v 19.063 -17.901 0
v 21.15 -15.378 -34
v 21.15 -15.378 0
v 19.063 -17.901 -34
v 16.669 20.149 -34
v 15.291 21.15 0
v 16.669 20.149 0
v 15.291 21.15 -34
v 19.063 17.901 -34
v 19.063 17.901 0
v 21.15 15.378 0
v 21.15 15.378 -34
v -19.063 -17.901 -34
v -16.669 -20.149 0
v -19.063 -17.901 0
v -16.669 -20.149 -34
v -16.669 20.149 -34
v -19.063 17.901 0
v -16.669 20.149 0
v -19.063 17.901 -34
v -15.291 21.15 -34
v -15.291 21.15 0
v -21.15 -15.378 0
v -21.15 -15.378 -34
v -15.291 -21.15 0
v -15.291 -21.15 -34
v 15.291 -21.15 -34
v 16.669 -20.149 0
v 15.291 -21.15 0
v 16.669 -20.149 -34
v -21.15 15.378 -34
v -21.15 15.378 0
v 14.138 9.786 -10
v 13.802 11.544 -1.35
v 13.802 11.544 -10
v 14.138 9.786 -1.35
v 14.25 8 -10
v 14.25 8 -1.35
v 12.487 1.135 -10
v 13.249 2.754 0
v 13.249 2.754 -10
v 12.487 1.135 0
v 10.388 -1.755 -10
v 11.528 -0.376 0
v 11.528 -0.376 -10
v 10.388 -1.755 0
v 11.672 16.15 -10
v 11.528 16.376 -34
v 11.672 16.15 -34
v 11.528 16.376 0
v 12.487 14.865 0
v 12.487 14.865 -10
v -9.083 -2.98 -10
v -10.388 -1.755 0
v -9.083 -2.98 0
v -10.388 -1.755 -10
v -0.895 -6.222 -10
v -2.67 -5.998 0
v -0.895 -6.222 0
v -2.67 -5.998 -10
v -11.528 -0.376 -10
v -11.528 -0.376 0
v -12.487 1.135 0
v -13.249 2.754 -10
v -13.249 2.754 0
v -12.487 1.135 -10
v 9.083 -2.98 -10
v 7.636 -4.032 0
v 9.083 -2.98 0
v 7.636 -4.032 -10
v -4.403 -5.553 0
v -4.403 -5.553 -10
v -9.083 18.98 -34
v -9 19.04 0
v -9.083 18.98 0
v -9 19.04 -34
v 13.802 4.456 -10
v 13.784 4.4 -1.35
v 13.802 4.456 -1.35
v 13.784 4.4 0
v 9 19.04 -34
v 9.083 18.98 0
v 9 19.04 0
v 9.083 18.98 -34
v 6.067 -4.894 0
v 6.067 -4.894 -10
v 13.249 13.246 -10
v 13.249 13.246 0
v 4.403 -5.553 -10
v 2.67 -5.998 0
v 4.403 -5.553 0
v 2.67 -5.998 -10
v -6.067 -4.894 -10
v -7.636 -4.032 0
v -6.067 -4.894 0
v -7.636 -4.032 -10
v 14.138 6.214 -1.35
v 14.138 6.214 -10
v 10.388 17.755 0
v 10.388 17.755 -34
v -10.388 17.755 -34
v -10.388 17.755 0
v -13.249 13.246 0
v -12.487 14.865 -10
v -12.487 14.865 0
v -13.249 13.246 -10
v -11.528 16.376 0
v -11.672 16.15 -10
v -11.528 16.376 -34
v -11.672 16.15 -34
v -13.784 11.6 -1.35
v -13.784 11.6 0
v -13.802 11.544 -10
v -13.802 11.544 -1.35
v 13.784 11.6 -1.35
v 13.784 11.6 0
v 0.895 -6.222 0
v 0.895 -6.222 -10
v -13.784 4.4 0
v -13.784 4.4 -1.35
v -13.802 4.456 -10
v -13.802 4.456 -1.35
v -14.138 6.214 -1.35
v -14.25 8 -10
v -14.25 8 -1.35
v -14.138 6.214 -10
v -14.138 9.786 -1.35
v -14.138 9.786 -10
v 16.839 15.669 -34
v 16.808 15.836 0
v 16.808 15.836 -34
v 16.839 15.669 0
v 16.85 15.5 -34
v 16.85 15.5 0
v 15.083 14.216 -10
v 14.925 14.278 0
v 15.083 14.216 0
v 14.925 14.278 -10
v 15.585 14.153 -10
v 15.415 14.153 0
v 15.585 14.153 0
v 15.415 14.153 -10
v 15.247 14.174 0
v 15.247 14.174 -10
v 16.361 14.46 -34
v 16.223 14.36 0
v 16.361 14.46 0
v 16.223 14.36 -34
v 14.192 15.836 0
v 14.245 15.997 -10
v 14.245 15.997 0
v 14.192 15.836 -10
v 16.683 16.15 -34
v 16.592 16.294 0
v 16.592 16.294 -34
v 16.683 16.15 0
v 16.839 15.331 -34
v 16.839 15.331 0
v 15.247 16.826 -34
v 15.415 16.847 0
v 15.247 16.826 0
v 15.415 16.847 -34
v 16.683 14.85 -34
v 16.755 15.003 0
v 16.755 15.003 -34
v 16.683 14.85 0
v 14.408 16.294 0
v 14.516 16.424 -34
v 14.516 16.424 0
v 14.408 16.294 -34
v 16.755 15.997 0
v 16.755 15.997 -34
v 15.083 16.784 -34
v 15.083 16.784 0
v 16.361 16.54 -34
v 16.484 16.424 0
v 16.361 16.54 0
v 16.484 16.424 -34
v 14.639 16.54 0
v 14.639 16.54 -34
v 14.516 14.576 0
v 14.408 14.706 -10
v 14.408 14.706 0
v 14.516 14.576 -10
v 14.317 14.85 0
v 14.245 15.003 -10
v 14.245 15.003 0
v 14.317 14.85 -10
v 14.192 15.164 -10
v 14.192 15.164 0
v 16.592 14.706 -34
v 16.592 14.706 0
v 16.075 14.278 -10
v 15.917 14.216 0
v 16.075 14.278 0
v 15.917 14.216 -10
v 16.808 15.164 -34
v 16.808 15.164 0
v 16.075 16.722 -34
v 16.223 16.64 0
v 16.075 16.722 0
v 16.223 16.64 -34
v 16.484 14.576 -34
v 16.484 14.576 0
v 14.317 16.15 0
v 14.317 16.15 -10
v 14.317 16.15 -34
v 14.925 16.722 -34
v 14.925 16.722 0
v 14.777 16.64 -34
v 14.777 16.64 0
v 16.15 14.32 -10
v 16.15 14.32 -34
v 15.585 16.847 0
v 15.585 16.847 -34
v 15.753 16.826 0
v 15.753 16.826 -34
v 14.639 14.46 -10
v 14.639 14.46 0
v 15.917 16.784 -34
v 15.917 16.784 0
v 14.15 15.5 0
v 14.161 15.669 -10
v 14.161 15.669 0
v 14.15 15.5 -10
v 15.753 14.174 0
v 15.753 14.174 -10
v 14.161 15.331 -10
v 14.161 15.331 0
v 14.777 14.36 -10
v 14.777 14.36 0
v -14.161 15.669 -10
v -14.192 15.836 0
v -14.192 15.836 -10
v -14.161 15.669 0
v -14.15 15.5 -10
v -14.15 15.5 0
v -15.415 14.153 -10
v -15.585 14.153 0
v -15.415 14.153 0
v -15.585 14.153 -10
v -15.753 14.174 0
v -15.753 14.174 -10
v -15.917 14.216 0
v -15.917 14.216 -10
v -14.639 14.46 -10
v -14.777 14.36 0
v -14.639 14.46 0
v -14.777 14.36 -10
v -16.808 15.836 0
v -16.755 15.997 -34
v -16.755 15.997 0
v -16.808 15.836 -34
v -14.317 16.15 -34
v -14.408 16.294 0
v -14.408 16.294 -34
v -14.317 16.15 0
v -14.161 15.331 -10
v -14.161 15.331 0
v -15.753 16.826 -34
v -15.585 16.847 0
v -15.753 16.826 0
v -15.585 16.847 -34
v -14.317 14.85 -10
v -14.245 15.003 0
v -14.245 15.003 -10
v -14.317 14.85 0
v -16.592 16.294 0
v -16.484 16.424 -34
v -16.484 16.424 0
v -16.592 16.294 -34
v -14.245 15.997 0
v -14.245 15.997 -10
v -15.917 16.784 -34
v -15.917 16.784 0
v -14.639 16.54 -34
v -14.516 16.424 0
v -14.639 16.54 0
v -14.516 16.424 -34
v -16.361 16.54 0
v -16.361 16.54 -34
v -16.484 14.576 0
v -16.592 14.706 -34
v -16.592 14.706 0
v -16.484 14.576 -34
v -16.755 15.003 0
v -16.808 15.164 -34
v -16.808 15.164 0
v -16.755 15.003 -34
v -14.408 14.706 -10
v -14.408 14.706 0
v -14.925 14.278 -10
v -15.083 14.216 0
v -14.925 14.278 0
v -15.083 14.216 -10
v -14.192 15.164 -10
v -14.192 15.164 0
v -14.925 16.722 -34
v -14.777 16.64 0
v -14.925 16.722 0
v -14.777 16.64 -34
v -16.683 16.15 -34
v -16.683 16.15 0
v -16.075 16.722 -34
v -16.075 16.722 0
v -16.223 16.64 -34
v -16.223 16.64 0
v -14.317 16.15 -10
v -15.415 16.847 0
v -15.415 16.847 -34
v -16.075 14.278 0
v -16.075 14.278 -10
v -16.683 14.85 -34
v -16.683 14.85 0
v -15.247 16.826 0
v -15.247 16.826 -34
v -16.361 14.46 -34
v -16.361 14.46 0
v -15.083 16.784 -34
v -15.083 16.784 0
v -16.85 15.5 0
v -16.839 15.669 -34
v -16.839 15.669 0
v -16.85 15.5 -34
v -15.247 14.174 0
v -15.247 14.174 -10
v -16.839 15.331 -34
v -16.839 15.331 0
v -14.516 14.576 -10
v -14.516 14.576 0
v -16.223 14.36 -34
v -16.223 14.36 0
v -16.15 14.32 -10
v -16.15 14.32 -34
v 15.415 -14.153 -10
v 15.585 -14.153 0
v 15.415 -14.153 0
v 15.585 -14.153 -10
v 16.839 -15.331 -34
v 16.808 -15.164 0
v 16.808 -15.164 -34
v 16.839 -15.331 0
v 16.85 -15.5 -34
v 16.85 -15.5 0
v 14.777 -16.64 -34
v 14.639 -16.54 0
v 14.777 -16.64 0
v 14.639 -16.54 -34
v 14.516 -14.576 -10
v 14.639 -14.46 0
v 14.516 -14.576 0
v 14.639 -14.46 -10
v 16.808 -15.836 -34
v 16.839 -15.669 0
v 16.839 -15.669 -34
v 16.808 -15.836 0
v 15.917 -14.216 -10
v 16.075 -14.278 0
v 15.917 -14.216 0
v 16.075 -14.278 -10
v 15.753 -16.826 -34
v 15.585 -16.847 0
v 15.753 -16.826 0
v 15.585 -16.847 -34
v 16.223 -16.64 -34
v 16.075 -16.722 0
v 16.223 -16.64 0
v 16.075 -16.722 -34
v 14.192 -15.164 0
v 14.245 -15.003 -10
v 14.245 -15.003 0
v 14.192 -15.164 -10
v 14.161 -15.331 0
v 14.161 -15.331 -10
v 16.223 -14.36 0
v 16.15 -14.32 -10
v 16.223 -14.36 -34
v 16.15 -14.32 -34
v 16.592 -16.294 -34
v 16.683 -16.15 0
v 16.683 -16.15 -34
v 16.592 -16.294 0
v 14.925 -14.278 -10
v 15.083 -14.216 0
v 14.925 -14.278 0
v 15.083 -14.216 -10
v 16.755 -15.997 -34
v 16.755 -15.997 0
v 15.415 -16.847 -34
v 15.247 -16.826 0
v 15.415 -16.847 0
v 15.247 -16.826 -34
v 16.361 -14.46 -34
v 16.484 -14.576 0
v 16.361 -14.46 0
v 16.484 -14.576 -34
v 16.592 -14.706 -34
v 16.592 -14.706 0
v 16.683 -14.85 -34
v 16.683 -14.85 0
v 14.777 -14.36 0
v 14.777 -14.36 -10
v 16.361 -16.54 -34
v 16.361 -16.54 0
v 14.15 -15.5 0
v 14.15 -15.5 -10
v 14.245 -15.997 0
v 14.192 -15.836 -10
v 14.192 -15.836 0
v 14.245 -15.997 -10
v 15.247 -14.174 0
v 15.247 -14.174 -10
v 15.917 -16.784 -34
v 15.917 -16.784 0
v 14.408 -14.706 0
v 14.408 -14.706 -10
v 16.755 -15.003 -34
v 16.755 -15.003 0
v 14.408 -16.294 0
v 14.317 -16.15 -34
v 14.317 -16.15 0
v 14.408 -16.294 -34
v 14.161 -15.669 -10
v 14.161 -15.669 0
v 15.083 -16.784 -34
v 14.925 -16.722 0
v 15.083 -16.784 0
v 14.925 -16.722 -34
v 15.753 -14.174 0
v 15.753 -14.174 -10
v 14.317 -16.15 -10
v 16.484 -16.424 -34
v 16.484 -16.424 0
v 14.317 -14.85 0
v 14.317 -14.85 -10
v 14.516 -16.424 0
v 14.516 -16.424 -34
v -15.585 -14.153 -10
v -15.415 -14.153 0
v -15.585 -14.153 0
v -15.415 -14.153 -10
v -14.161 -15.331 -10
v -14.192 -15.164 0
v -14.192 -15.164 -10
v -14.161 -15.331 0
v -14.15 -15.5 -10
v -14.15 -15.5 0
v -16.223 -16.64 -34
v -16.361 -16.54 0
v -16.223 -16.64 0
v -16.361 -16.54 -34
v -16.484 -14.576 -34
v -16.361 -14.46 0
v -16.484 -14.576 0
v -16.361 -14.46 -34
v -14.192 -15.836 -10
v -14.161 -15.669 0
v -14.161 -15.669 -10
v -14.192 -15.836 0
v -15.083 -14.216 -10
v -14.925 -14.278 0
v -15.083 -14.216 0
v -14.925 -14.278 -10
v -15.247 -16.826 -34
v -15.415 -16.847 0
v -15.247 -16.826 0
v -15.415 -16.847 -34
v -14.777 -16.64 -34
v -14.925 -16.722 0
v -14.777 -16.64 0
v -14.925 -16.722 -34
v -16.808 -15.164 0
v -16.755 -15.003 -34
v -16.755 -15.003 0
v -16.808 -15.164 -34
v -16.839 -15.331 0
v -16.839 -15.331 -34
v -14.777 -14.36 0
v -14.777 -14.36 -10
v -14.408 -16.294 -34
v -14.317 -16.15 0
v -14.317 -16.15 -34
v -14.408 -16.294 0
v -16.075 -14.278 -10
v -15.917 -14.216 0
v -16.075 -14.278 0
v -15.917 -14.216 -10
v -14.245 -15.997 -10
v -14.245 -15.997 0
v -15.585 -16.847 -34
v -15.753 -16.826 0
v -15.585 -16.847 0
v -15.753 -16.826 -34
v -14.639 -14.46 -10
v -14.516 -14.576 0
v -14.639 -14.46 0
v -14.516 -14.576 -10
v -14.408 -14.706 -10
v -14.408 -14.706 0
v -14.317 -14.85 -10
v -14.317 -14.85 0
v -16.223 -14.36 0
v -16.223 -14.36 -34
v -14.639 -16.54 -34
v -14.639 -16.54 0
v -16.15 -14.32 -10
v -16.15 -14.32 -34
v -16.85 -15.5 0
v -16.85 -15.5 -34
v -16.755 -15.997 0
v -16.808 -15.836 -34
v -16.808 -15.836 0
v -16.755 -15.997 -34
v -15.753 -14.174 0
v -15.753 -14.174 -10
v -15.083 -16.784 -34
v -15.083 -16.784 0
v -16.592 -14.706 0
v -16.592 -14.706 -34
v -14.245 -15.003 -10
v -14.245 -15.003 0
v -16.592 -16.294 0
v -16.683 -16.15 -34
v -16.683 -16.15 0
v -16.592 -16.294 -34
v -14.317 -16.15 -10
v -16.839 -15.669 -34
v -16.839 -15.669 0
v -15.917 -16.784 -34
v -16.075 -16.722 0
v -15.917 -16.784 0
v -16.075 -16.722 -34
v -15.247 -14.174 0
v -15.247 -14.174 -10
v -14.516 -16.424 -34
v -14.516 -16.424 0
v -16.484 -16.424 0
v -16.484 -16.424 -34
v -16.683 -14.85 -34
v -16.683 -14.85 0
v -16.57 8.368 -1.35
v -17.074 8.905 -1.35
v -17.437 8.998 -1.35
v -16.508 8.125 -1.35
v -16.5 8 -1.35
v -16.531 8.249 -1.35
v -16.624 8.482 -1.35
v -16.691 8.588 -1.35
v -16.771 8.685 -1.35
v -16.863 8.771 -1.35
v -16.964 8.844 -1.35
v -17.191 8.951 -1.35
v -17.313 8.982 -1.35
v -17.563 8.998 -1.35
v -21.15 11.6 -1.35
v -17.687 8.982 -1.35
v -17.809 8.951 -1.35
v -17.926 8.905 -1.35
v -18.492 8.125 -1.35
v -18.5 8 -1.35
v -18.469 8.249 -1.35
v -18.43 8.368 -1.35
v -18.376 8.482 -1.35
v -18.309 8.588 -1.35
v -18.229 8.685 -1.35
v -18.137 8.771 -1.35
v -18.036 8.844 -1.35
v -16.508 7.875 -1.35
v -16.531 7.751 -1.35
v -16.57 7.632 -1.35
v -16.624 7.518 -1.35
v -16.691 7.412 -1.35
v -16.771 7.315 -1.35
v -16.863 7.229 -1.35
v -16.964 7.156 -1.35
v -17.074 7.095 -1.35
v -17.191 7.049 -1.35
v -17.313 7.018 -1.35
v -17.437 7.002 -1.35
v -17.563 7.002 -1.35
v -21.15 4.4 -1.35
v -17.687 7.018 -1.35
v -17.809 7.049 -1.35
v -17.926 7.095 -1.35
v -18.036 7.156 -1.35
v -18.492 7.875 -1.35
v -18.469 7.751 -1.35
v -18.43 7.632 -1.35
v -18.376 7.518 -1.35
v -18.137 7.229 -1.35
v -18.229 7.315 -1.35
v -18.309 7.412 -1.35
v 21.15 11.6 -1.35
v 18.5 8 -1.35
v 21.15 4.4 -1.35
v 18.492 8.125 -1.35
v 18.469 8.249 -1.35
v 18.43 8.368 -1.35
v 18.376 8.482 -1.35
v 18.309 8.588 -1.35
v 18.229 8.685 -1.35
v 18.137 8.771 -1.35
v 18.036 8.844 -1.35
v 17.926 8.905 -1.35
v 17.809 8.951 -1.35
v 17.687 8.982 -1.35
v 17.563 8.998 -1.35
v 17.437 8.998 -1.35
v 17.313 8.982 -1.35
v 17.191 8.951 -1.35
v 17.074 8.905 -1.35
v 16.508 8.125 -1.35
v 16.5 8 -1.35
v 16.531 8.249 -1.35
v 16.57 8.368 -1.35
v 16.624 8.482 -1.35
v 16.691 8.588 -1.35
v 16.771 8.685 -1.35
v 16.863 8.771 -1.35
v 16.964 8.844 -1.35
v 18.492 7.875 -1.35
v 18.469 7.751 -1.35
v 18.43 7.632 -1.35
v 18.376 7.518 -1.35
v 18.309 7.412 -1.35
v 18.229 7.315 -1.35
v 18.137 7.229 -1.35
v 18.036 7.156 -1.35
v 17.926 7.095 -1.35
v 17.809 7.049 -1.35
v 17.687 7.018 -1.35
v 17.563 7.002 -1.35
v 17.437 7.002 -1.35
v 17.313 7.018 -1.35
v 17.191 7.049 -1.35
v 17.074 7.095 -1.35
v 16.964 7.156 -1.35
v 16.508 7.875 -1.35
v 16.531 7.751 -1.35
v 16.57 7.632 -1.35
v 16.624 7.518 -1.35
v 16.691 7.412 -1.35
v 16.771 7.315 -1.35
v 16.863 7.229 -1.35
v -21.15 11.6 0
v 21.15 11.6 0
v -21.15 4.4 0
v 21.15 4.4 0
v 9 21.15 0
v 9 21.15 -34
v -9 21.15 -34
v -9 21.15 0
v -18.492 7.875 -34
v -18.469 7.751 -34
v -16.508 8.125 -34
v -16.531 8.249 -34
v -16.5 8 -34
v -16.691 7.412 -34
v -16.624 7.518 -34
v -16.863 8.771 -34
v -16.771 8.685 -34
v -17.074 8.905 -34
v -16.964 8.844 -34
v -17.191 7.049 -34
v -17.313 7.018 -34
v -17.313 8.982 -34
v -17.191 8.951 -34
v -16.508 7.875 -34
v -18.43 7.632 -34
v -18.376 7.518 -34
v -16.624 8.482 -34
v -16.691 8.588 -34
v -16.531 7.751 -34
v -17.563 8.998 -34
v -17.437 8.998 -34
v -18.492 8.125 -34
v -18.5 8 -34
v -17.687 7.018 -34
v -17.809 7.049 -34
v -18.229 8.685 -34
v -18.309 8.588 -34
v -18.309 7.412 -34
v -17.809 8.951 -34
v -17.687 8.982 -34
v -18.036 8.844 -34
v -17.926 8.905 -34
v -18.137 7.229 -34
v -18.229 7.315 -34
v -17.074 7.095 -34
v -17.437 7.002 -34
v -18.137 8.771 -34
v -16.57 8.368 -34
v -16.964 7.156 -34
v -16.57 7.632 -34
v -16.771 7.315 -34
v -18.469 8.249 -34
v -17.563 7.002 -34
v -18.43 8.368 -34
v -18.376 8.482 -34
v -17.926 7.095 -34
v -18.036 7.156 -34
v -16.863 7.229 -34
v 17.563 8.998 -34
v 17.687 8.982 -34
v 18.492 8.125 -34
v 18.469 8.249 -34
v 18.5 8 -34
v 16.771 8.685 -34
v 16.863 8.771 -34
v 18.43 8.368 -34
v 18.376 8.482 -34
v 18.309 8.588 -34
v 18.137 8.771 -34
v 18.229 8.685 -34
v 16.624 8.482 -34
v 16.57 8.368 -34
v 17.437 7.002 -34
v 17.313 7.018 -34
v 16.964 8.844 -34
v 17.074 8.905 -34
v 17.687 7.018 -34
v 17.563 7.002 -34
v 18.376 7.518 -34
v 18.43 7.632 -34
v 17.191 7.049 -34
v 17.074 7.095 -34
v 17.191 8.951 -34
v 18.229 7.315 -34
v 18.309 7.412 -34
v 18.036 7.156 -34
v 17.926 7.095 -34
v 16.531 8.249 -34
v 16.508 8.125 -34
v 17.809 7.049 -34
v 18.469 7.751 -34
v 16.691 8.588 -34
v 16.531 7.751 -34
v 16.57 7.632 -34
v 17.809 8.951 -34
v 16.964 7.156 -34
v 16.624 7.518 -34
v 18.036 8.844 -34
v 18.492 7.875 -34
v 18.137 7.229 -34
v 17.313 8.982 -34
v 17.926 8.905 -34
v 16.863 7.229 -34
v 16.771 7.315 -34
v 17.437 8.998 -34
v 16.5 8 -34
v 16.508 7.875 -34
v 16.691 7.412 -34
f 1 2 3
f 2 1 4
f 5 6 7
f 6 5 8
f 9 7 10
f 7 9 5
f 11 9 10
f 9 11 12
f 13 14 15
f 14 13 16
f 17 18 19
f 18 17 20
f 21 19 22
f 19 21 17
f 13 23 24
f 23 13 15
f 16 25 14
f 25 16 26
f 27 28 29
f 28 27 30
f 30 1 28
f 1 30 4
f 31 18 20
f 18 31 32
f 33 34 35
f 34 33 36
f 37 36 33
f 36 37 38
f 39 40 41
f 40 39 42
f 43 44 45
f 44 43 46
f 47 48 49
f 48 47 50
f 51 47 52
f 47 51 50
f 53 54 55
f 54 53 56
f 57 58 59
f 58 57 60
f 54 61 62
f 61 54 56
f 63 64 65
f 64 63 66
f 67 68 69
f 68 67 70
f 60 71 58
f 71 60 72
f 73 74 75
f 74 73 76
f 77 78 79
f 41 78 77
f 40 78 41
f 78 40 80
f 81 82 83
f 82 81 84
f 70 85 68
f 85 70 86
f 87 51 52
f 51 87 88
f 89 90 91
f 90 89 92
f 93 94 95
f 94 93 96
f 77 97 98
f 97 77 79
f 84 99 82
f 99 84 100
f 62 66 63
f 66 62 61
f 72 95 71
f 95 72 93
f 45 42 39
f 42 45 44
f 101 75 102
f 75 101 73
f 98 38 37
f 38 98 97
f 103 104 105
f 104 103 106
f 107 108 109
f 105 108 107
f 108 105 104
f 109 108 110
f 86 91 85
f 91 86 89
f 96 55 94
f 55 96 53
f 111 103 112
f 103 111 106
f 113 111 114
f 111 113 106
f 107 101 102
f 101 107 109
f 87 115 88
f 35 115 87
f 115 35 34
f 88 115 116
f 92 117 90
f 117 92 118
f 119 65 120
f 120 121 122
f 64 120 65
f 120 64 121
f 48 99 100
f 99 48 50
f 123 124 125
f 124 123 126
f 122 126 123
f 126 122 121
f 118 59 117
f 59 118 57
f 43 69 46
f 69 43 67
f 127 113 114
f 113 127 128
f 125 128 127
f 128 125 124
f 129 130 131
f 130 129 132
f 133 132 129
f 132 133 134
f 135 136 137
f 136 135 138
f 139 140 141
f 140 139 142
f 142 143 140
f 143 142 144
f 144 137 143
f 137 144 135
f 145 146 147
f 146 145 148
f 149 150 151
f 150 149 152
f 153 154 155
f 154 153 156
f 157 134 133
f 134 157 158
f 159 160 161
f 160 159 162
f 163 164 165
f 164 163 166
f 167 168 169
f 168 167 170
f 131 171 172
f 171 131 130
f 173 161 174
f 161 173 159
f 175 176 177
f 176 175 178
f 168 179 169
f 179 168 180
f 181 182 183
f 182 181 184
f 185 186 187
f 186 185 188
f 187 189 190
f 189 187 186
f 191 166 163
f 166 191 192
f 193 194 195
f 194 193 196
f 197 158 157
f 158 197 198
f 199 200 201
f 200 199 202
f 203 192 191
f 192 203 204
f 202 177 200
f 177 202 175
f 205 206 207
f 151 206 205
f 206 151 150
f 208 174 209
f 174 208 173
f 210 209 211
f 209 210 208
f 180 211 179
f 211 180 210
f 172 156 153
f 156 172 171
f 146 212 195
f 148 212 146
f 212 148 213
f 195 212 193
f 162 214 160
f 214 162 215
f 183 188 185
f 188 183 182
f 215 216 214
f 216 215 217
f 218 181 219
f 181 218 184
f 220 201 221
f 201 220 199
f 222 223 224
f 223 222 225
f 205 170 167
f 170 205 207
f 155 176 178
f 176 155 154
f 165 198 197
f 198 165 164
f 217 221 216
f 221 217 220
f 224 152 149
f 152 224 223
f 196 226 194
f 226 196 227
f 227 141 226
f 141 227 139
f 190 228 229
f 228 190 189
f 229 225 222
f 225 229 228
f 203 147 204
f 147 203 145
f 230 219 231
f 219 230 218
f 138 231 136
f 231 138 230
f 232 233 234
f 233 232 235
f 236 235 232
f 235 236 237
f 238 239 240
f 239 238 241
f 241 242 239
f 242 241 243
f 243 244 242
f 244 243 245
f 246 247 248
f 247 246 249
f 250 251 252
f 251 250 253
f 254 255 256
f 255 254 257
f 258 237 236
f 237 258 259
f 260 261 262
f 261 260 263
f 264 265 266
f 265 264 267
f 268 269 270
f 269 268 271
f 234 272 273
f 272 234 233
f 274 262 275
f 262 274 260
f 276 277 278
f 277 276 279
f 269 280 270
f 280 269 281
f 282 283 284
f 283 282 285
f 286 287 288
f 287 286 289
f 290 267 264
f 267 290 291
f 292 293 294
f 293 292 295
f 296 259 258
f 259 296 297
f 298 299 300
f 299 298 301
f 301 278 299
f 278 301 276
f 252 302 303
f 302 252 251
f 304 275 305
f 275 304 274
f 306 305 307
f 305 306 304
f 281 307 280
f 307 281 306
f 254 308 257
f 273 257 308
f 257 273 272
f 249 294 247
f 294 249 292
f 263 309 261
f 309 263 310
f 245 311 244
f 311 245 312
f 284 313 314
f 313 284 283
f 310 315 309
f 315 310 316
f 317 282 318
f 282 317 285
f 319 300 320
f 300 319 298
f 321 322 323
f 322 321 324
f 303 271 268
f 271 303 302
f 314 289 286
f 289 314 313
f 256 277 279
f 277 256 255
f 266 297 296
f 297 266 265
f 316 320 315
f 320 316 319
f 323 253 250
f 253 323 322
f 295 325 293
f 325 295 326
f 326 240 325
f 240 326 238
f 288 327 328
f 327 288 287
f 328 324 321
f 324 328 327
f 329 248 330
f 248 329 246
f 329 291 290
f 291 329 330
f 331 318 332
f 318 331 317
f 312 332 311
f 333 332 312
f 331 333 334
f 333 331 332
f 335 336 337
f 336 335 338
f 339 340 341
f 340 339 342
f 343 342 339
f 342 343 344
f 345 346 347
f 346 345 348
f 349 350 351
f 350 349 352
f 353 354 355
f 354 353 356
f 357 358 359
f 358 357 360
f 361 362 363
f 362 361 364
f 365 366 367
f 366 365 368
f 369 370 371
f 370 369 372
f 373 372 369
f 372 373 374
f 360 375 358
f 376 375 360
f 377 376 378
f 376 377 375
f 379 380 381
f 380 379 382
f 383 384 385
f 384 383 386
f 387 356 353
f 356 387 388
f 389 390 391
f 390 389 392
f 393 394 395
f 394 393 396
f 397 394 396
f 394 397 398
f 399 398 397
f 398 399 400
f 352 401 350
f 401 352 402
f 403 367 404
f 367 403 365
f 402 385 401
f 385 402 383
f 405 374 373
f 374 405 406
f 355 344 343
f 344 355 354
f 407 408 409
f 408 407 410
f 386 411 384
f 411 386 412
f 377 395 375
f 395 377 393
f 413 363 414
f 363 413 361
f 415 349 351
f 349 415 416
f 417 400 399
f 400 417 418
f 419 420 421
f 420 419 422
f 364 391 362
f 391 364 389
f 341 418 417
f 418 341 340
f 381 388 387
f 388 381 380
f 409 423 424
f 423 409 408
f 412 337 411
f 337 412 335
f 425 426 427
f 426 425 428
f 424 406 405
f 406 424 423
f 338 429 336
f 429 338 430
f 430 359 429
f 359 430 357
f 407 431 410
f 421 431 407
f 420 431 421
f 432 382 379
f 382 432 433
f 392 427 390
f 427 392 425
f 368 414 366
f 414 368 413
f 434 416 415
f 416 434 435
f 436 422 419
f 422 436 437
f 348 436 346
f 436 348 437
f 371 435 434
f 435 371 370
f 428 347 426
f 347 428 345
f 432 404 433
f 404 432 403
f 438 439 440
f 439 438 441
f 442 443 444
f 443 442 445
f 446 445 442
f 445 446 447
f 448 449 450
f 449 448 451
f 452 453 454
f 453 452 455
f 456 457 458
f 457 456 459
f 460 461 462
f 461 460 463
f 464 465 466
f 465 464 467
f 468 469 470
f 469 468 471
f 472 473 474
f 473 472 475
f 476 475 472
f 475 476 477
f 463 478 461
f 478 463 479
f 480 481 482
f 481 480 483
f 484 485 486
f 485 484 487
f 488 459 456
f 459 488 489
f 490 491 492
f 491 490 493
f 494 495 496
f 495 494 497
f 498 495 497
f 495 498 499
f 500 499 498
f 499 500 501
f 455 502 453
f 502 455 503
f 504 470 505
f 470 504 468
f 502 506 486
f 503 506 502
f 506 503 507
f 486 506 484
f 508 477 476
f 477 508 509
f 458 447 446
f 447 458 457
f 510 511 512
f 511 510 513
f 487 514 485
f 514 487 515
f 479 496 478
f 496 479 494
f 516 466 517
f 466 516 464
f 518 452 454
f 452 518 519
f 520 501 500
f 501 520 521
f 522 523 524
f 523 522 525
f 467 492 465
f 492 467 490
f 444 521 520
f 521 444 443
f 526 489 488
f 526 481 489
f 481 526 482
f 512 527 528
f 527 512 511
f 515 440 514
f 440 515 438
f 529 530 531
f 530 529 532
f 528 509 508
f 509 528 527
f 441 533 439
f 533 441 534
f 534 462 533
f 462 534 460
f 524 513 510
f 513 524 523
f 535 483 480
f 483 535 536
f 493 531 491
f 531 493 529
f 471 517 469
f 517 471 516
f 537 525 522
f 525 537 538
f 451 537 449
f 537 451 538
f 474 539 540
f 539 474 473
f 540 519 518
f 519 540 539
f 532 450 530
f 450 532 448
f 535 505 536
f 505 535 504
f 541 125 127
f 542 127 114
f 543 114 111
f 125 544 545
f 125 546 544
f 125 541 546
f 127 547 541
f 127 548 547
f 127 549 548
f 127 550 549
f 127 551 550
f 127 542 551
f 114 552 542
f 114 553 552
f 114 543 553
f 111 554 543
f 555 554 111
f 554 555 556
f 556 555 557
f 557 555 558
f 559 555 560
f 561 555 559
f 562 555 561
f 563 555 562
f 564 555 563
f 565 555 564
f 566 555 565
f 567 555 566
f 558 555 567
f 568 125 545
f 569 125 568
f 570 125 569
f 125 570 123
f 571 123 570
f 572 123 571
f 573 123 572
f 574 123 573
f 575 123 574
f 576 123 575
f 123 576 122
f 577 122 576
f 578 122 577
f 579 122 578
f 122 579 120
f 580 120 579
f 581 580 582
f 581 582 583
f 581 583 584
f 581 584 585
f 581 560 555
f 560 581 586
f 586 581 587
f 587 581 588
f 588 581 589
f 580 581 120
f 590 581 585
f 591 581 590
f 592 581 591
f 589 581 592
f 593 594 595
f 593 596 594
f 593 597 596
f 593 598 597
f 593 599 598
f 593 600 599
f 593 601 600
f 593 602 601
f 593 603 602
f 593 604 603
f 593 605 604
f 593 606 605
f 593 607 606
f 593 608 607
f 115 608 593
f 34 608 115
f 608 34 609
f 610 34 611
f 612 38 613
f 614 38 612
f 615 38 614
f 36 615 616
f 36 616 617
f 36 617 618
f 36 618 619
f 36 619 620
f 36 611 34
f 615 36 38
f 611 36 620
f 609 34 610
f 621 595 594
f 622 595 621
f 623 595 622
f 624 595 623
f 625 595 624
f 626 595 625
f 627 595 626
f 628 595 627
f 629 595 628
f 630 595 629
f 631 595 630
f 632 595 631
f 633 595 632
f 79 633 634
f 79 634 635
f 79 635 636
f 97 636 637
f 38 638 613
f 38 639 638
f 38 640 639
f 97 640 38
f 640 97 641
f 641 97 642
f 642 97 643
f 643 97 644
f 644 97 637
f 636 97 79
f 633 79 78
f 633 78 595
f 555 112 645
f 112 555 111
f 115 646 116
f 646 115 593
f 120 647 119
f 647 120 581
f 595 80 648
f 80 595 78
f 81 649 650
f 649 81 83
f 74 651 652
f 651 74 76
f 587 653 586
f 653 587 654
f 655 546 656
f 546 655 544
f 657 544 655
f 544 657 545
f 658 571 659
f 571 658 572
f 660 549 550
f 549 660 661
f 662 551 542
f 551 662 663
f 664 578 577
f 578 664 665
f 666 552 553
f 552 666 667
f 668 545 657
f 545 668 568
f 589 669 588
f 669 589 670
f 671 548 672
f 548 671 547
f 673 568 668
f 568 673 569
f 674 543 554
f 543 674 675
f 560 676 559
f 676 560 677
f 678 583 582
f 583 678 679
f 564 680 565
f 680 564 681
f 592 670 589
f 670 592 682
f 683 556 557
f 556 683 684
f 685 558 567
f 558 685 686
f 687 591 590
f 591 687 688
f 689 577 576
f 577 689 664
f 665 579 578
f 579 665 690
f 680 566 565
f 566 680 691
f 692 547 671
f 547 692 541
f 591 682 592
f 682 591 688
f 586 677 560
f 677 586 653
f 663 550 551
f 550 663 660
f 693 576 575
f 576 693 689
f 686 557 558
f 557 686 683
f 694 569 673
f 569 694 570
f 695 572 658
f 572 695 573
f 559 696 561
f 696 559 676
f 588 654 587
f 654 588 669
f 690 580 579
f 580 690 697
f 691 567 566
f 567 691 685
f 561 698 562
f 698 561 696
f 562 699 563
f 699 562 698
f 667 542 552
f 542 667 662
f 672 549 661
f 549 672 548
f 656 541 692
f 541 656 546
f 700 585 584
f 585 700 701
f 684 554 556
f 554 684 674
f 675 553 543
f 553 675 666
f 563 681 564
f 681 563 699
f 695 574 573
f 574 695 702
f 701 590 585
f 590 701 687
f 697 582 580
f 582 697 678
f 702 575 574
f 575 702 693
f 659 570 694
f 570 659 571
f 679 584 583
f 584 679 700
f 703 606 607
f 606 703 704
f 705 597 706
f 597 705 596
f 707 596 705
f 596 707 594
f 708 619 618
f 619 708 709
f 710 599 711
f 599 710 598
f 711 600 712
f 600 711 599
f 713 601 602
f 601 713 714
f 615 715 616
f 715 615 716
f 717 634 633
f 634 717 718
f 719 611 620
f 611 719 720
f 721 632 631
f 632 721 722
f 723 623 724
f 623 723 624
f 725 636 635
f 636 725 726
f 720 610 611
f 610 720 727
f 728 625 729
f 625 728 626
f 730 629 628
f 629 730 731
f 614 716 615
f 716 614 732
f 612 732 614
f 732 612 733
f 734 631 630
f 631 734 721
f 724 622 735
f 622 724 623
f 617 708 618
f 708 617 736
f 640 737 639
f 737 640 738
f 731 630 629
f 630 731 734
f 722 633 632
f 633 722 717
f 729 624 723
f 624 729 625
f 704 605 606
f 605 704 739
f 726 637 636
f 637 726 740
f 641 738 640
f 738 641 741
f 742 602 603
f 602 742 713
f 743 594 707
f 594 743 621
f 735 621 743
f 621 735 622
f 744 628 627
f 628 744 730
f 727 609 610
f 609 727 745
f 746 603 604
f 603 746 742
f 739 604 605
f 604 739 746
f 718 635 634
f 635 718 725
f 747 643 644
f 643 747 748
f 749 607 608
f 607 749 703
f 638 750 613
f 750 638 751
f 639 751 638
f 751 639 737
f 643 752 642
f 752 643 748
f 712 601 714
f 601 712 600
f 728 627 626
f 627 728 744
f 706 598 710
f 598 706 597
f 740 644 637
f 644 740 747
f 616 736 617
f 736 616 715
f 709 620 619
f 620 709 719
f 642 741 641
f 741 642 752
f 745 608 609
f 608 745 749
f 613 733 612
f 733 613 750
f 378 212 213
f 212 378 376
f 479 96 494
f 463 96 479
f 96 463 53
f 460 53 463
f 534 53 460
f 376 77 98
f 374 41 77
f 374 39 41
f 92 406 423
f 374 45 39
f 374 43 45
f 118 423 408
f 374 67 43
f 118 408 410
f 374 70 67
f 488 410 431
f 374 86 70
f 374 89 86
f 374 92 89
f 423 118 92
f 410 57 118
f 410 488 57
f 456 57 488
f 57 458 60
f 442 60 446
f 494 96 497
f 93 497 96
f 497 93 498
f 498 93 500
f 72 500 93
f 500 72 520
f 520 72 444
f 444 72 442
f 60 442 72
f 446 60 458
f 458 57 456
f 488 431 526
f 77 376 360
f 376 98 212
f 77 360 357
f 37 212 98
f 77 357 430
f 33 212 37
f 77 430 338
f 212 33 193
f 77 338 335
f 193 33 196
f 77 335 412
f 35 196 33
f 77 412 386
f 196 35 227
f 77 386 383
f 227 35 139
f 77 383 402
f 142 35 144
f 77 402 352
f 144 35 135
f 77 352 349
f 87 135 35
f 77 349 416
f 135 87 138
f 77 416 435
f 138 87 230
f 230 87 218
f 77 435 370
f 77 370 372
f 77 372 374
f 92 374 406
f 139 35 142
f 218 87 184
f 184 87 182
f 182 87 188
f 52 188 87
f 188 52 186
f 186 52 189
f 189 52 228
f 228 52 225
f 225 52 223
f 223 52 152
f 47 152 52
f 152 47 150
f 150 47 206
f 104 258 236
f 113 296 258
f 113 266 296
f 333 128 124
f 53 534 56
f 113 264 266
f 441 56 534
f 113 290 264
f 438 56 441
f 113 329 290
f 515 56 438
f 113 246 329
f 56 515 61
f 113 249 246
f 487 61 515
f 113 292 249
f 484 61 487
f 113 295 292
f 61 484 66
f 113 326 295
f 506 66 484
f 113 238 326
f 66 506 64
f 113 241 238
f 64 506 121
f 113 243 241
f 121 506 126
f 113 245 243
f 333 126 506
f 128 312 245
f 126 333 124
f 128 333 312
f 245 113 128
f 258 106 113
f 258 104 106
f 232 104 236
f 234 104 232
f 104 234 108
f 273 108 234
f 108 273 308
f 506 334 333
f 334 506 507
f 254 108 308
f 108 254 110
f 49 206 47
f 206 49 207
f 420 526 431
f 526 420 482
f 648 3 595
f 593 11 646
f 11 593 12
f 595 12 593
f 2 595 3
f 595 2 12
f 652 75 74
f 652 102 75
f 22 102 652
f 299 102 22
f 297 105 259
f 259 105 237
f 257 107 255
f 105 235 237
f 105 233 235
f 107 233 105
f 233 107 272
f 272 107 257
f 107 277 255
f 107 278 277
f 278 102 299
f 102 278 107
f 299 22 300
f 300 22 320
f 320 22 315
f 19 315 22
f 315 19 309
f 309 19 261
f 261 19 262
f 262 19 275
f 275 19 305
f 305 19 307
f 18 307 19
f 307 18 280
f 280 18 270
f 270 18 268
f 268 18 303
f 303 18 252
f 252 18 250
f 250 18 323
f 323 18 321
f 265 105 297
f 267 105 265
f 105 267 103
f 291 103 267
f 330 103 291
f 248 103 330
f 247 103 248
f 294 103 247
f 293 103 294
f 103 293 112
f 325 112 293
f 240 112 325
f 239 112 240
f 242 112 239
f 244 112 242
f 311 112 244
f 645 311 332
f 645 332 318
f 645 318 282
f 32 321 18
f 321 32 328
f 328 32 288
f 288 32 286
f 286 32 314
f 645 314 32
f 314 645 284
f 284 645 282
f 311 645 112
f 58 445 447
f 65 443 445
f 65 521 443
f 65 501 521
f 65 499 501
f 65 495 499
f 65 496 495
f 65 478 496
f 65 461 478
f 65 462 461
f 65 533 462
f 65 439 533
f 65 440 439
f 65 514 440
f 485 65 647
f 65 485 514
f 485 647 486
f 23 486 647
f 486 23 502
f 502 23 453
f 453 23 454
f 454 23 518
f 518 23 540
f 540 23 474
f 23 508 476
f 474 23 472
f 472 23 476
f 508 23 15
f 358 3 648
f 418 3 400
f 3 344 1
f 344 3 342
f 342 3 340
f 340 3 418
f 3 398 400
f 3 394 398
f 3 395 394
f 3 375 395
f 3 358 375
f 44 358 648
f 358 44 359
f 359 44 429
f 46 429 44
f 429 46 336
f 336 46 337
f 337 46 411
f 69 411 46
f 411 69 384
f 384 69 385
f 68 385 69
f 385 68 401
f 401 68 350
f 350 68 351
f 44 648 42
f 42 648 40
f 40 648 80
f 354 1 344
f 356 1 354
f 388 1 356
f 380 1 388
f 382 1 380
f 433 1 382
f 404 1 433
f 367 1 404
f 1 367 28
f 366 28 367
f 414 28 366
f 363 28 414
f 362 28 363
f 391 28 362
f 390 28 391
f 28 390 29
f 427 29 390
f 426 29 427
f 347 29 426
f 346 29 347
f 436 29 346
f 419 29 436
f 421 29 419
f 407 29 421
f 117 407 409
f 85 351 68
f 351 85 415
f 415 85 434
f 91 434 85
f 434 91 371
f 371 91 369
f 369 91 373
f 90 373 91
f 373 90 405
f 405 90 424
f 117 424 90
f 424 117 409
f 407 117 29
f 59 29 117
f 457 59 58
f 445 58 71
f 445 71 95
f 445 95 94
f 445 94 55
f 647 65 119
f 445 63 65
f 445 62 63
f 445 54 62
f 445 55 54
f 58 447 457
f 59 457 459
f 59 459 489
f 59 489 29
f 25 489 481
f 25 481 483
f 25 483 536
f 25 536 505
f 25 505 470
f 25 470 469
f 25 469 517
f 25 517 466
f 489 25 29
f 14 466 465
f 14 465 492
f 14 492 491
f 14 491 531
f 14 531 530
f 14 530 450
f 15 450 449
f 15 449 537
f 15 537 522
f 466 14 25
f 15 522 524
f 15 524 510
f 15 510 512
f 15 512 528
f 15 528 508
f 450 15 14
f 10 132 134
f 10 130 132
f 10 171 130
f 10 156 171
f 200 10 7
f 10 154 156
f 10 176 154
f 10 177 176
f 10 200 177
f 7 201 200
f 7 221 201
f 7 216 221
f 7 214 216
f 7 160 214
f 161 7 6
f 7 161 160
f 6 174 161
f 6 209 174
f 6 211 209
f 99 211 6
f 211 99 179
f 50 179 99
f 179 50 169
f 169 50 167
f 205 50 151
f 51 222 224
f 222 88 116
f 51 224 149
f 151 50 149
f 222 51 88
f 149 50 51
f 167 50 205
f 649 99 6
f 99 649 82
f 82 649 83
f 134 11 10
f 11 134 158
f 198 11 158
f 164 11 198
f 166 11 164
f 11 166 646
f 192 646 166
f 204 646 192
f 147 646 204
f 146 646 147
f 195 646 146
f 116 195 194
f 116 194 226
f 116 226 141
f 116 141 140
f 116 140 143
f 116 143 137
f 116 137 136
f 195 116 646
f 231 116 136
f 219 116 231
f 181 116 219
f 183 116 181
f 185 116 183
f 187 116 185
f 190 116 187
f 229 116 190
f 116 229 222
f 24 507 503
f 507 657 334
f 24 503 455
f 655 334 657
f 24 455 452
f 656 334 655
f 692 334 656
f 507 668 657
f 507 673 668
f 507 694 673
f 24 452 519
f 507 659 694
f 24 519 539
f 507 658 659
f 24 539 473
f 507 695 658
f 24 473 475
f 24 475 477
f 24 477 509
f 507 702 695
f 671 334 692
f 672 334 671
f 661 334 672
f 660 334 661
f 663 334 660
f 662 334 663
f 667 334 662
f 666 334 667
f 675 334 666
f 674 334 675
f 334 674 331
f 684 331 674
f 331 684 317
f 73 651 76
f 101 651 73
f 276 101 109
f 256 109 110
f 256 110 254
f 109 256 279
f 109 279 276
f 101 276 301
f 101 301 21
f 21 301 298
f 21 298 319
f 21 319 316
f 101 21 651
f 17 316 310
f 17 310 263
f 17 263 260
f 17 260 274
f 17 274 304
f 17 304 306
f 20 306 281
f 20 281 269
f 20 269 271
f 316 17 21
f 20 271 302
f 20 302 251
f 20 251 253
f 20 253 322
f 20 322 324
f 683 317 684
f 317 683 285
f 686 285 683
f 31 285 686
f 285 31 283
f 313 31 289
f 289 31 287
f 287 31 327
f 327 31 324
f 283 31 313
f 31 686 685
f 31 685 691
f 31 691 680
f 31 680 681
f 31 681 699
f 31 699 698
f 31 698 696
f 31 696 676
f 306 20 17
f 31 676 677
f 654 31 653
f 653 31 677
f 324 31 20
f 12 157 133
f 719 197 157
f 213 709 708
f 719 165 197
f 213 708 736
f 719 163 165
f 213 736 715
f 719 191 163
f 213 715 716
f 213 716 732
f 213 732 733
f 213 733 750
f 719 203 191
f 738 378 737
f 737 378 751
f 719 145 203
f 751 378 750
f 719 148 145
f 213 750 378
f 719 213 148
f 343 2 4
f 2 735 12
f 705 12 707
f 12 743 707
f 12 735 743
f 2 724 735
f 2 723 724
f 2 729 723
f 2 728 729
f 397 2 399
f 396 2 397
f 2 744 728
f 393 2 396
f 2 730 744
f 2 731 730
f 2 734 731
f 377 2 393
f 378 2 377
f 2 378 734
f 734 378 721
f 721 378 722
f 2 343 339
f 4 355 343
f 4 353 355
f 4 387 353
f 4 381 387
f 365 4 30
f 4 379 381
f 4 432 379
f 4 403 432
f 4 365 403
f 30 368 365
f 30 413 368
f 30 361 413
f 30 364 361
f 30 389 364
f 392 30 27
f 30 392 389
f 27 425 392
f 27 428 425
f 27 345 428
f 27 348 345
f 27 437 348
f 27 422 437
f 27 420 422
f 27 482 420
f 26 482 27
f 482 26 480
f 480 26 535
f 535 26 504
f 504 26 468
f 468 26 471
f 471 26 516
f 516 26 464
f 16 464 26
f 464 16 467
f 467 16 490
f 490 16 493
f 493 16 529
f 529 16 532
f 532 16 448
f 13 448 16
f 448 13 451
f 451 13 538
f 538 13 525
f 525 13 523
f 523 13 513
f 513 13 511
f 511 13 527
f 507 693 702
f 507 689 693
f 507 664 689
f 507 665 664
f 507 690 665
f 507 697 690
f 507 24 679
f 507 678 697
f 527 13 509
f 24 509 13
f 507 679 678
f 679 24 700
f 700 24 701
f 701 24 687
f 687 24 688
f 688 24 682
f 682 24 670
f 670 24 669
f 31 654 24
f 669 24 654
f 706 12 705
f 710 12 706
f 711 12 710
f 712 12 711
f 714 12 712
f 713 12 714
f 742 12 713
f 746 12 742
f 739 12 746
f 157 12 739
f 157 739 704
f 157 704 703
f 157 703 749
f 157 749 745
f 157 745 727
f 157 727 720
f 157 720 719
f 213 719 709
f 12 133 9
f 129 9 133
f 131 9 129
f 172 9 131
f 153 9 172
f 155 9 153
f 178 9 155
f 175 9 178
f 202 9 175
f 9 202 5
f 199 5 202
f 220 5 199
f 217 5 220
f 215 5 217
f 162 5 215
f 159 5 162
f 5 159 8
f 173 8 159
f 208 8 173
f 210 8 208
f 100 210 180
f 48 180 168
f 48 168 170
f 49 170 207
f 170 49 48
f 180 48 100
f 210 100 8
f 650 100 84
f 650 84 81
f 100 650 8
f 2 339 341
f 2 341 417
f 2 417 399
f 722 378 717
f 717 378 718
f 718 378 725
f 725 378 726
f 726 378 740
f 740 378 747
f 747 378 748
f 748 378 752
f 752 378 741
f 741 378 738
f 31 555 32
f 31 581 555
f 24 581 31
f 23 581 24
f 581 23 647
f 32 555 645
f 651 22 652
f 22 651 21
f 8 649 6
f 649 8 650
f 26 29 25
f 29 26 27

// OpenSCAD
/* 
***************************************************************************
    Adapter from motor 28BY-48 to motor 17HS
    Copyright (C) 2016 Andrey Kostin

    This program is free software: you can redistribute it and/or modify
    it under the terms of the GNU General Public License as published by
    the Free Software Foundation, either version 3 of the License, or
     any later version.

    This program is distributed in the hope that it will be useful,
    but WITHOUT ANY WARRANTY.
    See the GNU General Public License for more details.

************************************************************************* 
*/

//height motor
ht = 34;//17HS42

//width motor
a = 42.3; //17HS42

//distance from hole to surface motor
kd =5.65;

$fn = 50;

difference(){   
    
translate(v=[0,0,-ht/2]){
cube([a,a,ht], center=true);
}
union(){        
    
//case 28BY-48
translate(v=[0,8,-(ht+1)]){
cylinder(h=ht+2,r=28.5/2,r2=28.5/2);
}
translate(v=[((a/2)-kd),((a/2)-kd),-(ht+1)]){
cylinder(h=ht+2,r=2.7/2,r2=2.7/2);
}
translate(v=[-((a/2)-kd),((a/2)-kd),-(ht+1)]){
cylinder(h=ht+2,r=2.7/2,r2=2.7/2);
}
translate(v=[((a/2)-kd),-((a/2)-kd),-(ht+1)]){
cylinder(h=ht+2,r=2.7/2,r2=2.7/2);
}
translate(v=[-((a/2)-kd),-((a/2)-kd),-(ht+1)]){
cylinder(h=ht+2,r=2.7/2,r2=2.7/2);
}
//mount 28BY-48
translate(v=[0,8,-1/2]){
cube([a+2,7.2,1.7], center=true);
}
//side box 28BY-48
translate(v=[0,((28.5/2)+8),-(ht/2)]){
cube([18,8,(ht+2)], center=true);
}
//the bolts 28BY-48
translate(v=[-35/2,8,-(ht+2)]){
cylinder(h=ht+4,r=1,r2=1);
}
translate(v=[35/2,8,-(ht+2)]){
cylinder(h=ht+4,r=1,r2=1);
}
translate(v=[0,0,-((ht/2)+10)]){
cube([(a-10),(a-10),ht], center=true);
}
//cylinder for smooth edges
difference(){   
translate(v=[0,0,-(ht+1)]){    
cylinder(h=ht+4,r=a+5,r2=a+5);
}
translate(v=[0,0,-(ht+2)]){
cylinder(h=ht+6,r=a/2+5,r2=a/2+5);}
}
}
}
